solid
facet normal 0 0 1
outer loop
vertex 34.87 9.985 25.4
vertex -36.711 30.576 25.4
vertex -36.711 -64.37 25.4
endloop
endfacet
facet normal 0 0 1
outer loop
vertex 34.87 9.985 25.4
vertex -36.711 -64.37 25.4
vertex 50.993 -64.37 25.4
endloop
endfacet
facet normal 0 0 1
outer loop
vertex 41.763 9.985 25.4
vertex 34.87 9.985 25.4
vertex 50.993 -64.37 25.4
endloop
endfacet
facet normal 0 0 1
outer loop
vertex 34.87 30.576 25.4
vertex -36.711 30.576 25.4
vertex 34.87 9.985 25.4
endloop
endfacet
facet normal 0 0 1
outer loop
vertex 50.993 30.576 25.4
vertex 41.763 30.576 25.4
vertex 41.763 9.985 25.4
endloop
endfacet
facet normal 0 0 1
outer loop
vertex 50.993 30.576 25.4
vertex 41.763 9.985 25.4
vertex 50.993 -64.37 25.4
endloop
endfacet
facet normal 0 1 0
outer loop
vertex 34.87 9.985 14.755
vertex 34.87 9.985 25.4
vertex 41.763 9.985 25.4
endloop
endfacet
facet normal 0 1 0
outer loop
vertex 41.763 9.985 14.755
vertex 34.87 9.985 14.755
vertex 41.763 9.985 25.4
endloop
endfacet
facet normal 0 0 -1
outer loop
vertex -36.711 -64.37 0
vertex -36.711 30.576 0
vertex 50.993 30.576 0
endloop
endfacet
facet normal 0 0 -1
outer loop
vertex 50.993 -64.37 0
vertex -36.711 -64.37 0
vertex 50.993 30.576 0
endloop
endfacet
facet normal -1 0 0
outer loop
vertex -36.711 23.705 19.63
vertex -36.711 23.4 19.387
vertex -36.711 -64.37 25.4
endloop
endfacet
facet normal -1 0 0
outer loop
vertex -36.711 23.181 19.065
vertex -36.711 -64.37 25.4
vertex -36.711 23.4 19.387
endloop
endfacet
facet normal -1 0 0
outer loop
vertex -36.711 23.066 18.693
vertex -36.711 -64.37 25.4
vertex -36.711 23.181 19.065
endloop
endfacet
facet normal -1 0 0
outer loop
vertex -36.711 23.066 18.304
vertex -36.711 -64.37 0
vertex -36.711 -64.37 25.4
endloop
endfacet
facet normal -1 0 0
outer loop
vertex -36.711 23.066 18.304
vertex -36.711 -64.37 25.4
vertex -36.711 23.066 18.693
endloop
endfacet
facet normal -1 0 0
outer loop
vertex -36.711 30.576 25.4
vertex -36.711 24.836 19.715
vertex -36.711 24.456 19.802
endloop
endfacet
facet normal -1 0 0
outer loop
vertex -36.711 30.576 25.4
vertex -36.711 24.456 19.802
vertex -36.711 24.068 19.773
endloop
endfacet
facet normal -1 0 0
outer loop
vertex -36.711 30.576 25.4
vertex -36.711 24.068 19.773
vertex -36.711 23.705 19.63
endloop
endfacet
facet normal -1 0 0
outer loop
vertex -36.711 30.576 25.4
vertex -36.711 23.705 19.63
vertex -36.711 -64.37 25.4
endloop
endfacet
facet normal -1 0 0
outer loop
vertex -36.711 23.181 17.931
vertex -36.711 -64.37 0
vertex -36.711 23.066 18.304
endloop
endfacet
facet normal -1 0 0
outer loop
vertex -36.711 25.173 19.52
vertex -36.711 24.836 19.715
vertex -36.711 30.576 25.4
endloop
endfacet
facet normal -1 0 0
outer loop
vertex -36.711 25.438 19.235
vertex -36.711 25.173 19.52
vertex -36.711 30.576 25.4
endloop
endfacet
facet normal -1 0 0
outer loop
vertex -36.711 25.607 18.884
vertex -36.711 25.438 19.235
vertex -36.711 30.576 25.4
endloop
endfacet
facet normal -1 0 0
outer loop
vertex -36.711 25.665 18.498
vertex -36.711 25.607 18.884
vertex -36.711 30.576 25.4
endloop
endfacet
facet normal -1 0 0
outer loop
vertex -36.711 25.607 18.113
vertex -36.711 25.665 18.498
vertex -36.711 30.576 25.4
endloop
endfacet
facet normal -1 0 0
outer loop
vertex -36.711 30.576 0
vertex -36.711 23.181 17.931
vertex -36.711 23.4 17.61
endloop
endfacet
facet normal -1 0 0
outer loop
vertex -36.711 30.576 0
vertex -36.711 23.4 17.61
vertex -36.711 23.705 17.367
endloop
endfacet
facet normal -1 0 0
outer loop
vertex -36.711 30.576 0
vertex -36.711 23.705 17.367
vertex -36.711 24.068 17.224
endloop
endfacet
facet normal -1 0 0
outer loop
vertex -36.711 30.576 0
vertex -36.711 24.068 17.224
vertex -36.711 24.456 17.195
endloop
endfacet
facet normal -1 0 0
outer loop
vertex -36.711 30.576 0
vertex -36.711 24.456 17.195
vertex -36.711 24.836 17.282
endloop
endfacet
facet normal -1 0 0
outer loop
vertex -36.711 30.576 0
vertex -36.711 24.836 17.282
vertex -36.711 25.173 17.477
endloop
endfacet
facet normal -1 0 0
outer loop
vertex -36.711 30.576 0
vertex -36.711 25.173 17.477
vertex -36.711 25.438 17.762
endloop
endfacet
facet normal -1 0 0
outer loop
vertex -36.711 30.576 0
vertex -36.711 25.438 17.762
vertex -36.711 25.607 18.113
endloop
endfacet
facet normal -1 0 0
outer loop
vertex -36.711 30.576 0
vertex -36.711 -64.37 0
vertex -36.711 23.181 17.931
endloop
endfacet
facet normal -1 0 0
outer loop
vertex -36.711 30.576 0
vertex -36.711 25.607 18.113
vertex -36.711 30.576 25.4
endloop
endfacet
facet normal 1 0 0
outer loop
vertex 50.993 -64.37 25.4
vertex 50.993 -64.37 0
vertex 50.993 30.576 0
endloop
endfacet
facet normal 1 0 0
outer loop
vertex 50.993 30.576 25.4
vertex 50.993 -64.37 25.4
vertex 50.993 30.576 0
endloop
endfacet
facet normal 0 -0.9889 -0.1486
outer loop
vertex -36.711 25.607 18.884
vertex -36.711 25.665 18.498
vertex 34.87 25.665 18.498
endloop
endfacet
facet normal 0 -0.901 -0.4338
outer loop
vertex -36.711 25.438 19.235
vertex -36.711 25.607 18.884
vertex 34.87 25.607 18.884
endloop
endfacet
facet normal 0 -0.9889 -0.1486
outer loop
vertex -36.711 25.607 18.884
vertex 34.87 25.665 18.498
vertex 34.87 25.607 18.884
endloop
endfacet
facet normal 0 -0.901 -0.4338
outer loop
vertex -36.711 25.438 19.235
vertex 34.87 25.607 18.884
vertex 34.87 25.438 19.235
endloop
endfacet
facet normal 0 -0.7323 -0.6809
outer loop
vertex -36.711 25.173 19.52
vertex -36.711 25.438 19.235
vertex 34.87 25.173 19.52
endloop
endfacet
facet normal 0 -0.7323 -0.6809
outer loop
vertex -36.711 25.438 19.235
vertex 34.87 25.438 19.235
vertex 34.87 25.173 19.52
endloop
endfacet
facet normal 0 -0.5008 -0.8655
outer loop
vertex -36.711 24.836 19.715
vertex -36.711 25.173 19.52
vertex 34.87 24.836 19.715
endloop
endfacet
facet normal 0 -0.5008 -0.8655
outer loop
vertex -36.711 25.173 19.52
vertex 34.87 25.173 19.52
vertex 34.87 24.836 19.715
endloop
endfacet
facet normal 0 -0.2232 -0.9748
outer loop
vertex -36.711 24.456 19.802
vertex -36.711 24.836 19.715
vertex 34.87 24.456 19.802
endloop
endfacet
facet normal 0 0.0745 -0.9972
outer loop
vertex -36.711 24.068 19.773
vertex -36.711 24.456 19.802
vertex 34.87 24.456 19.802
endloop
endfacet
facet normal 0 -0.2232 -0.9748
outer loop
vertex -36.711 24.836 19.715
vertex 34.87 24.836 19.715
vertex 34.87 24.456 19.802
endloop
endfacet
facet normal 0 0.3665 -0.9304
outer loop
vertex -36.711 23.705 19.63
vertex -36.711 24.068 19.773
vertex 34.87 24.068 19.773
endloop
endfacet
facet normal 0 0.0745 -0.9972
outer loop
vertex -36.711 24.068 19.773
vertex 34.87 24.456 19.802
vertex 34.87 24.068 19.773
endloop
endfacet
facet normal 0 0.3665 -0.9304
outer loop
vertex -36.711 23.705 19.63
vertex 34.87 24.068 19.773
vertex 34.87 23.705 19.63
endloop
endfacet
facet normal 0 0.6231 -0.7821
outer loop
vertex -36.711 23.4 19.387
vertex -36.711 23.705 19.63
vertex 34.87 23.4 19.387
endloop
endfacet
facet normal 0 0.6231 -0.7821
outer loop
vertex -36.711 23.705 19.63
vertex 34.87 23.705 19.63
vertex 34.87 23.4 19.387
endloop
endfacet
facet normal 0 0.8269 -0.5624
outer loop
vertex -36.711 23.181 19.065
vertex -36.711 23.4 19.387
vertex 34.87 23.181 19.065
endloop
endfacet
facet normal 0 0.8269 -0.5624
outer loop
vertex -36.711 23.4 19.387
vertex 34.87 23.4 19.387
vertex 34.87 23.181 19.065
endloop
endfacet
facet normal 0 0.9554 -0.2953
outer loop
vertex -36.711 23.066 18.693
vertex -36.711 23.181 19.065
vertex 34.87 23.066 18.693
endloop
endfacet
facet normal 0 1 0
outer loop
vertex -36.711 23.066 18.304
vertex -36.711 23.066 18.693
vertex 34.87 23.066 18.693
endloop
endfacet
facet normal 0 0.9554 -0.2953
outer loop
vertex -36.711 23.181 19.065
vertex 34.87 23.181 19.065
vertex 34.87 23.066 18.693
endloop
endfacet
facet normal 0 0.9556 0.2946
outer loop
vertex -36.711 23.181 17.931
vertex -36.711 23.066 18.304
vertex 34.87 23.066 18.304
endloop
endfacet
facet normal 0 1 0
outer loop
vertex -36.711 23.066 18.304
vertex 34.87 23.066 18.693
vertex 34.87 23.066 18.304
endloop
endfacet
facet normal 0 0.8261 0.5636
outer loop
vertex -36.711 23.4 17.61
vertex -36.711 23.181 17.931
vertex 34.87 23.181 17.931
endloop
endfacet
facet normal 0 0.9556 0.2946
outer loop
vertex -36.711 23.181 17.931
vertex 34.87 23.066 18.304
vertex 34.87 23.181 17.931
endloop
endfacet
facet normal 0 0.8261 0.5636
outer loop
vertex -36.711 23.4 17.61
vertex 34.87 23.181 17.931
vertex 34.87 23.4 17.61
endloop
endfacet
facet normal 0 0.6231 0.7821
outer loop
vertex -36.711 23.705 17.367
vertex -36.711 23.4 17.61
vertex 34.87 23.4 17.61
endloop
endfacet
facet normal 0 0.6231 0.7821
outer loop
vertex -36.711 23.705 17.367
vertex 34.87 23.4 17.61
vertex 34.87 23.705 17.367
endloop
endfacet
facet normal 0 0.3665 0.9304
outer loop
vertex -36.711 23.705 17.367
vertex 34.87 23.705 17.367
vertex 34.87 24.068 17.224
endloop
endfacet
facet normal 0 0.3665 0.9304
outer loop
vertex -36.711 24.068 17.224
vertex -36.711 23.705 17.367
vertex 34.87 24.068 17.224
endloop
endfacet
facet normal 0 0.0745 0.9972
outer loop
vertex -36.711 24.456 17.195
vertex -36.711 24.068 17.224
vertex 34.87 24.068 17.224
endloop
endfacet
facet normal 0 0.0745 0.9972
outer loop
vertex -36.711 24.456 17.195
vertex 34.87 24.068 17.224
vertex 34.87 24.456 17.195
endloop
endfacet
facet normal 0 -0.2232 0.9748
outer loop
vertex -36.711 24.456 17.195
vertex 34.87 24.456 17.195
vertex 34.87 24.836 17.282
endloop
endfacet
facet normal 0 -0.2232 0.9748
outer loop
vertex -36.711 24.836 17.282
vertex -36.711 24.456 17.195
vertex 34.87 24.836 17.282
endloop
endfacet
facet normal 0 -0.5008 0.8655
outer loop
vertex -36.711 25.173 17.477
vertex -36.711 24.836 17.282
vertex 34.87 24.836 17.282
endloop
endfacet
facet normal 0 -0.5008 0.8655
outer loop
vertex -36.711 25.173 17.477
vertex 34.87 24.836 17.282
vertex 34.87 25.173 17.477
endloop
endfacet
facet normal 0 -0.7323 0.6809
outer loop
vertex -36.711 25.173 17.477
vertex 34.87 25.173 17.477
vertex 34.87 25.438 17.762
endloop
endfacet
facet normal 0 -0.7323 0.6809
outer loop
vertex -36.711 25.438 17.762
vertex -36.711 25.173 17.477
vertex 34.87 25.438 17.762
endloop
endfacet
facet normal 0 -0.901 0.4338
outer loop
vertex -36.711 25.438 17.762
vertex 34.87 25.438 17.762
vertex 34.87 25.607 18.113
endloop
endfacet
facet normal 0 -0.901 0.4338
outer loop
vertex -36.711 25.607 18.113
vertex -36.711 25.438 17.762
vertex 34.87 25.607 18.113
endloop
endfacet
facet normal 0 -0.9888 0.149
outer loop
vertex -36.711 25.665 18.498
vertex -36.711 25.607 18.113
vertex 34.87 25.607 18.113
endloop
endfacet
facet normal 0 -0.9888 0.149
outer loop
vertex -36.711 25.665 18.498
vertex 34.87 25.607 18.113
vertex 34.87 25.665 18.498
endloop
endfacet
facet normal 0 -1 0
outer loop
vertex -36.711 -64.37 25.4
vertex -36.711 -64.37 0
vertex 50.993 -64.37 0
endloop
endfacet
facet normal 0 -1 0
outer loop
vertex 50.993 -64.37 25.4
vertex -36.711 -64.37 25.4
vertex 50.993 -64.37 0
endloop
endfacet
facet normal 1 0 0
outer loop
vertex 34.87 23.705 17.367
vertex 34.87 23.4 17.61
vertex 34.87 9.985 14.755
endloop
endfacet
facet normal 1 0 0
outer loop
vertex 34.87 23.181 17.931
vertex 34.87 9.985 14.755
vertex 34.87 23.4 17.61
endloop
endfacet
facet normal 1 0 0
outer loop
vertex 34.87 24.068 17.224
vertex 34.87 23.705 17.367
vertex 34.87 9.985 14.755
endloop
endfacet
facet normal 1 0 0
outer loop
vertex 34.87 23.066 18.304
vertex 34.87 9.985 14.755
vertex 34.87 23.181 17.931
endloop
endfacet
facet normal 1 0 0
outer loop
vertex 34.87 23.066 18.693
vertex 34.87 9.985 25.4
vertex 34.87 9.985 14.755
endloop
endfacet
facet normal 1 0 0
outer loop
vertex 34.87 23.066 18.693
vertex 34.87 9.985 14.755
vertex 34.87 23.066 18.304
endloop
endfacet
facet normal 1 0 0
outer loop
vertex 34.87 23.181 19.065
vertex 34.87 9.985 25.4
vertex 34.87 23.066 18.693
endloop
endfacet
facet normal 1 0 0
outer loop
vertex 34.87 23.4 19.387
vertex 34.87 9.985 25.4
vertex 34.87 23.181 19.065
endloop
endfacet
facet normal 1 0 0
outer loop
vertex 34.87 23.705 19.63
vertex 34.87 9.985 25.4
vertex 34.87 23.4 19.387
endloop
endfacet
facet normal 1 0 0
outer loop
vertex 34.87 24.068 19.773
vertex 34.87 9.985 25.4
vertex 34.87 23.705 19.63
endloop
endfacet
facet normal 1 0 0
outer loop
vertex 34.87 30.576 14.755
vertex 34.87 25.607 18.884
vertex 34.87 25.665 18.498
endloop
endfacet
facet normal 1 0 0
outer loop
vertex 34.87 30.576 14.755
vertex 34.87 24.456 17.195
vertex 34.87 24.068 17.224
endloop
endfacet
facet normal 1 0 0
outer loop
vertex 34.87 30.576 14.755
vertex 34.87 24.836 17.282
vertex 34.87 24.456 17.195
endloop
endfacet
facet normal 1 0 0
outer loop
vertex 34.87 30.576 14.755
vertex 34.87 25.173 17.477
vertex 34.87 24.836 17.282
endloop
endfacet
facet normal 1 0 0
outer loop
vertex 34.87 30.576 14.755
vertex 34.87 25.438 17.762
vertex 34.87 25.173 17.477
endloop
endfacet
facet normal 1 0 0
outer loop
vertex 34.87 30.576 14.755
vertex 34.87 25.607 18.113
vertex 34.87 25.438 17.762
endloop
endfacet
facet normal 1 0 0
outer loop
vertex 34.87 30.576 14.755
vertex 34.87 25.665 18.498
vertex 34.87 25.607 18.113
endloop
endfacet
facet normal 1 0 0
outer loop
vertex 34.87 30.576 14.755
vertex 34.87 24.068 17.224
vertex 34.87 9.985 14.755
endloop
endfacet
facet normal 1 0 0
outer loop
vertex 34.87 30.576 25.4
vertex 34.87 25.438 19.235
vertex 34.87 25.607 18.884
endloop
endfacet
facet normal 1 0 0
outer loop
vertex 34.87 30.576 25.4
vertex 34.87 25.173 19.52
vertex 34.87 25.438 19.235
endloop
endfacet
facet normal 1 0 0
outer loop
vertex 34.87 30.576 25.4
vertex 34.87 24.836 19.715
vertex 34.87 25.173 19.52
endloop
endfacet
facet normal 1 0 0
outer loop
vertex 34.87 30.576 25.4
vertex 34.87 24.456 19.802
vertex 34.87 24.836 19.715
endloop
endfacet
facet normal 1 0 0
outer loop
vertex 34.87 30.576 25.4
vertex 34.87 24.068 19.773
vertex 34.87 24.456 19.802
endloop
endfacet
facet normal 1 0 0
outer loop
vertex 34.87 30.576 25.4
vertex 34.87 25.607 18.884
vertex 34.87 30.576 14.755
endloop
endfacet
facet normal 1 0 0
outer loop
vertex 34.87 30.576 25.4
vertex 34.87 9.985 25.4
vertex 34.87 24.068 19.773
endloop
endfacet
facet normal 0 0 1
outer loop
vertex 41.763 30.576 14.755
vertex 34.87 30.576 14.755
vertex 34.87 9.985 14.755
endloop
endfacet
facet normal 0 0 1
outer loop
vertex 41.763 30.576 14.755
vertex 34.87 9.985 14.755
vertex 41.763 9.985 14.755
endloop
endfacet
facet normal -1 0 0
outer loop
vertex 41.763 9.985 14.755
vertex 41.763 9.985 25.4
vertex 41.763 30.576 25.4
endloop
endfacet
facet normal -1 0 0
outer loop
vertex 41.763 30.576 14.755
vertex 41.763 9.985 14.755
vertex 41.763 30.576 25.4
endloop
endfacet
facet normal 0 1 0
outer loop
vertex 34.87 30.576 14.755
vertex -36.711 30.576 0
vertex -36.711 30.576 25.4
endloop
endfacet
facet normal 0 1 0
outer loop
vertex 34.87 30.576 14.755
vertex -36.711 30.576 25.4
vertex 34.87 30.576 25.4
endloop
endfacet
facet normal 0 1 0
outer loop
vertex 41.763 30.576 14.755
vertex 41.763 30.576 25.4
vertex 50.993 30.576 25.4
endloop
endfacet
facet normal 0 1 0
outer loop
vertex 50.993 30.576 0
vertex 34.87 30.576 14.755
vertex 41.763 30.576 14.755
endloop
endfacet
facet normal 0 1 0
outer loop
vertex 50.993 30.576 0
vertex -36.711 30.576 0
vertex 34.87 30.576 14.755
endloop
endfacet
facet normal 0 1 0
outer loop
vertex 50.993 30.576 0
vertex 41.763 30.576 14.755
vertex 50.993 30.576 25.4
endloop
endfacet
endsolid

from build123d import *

# Parameters (mm, degrees)
F0_W     = 87.7047851682
F0_H     = 94.9464440346
F1_DEPTH = 25.4
F4_W     = 6.8936049938
F4_H     = 20.5912292004
F5_DEPTH = 10.6445495039
F6_R     = 1.3068757952
F7_DEPTH = 71.5821401606


# Not quite as in the source:
# - the program builds the solid bodies; features that only make, move or delete a surface that nothing else refers to are left out


with BuildPart() as f1:
    # F0 (on Top) → F1 (new body)
    with BuildSketch(Plane.XY):
        with Locations((7.1410946548, -16.8972313404)):
            Rectangle(F0_W, F0_H)
    extrude(amount=F1_DEPTH)

    # F4 (on face) → F5 (cut)
    with BuildSketch(Plane.XY.offset(25.4)):
        with Locations((38.3166447282, 20.2803760767)):
            Rectangle(F4_W, F4_H)
    extrude(amount=-F5_DEPTH, mode=Mode.SUBTRACT)

    # F6 (on face) → F7 (cut, through all)
    with BuildSketch(Plane.YZ.offset(34.8698422313)):
        with Locations((24.3584793061, 18.4984076768)):
            Circle(F6_R)
    extrude(amount=-F7_DEPTH, mode=Mode.SUBTRACT)


solid = f1.part
